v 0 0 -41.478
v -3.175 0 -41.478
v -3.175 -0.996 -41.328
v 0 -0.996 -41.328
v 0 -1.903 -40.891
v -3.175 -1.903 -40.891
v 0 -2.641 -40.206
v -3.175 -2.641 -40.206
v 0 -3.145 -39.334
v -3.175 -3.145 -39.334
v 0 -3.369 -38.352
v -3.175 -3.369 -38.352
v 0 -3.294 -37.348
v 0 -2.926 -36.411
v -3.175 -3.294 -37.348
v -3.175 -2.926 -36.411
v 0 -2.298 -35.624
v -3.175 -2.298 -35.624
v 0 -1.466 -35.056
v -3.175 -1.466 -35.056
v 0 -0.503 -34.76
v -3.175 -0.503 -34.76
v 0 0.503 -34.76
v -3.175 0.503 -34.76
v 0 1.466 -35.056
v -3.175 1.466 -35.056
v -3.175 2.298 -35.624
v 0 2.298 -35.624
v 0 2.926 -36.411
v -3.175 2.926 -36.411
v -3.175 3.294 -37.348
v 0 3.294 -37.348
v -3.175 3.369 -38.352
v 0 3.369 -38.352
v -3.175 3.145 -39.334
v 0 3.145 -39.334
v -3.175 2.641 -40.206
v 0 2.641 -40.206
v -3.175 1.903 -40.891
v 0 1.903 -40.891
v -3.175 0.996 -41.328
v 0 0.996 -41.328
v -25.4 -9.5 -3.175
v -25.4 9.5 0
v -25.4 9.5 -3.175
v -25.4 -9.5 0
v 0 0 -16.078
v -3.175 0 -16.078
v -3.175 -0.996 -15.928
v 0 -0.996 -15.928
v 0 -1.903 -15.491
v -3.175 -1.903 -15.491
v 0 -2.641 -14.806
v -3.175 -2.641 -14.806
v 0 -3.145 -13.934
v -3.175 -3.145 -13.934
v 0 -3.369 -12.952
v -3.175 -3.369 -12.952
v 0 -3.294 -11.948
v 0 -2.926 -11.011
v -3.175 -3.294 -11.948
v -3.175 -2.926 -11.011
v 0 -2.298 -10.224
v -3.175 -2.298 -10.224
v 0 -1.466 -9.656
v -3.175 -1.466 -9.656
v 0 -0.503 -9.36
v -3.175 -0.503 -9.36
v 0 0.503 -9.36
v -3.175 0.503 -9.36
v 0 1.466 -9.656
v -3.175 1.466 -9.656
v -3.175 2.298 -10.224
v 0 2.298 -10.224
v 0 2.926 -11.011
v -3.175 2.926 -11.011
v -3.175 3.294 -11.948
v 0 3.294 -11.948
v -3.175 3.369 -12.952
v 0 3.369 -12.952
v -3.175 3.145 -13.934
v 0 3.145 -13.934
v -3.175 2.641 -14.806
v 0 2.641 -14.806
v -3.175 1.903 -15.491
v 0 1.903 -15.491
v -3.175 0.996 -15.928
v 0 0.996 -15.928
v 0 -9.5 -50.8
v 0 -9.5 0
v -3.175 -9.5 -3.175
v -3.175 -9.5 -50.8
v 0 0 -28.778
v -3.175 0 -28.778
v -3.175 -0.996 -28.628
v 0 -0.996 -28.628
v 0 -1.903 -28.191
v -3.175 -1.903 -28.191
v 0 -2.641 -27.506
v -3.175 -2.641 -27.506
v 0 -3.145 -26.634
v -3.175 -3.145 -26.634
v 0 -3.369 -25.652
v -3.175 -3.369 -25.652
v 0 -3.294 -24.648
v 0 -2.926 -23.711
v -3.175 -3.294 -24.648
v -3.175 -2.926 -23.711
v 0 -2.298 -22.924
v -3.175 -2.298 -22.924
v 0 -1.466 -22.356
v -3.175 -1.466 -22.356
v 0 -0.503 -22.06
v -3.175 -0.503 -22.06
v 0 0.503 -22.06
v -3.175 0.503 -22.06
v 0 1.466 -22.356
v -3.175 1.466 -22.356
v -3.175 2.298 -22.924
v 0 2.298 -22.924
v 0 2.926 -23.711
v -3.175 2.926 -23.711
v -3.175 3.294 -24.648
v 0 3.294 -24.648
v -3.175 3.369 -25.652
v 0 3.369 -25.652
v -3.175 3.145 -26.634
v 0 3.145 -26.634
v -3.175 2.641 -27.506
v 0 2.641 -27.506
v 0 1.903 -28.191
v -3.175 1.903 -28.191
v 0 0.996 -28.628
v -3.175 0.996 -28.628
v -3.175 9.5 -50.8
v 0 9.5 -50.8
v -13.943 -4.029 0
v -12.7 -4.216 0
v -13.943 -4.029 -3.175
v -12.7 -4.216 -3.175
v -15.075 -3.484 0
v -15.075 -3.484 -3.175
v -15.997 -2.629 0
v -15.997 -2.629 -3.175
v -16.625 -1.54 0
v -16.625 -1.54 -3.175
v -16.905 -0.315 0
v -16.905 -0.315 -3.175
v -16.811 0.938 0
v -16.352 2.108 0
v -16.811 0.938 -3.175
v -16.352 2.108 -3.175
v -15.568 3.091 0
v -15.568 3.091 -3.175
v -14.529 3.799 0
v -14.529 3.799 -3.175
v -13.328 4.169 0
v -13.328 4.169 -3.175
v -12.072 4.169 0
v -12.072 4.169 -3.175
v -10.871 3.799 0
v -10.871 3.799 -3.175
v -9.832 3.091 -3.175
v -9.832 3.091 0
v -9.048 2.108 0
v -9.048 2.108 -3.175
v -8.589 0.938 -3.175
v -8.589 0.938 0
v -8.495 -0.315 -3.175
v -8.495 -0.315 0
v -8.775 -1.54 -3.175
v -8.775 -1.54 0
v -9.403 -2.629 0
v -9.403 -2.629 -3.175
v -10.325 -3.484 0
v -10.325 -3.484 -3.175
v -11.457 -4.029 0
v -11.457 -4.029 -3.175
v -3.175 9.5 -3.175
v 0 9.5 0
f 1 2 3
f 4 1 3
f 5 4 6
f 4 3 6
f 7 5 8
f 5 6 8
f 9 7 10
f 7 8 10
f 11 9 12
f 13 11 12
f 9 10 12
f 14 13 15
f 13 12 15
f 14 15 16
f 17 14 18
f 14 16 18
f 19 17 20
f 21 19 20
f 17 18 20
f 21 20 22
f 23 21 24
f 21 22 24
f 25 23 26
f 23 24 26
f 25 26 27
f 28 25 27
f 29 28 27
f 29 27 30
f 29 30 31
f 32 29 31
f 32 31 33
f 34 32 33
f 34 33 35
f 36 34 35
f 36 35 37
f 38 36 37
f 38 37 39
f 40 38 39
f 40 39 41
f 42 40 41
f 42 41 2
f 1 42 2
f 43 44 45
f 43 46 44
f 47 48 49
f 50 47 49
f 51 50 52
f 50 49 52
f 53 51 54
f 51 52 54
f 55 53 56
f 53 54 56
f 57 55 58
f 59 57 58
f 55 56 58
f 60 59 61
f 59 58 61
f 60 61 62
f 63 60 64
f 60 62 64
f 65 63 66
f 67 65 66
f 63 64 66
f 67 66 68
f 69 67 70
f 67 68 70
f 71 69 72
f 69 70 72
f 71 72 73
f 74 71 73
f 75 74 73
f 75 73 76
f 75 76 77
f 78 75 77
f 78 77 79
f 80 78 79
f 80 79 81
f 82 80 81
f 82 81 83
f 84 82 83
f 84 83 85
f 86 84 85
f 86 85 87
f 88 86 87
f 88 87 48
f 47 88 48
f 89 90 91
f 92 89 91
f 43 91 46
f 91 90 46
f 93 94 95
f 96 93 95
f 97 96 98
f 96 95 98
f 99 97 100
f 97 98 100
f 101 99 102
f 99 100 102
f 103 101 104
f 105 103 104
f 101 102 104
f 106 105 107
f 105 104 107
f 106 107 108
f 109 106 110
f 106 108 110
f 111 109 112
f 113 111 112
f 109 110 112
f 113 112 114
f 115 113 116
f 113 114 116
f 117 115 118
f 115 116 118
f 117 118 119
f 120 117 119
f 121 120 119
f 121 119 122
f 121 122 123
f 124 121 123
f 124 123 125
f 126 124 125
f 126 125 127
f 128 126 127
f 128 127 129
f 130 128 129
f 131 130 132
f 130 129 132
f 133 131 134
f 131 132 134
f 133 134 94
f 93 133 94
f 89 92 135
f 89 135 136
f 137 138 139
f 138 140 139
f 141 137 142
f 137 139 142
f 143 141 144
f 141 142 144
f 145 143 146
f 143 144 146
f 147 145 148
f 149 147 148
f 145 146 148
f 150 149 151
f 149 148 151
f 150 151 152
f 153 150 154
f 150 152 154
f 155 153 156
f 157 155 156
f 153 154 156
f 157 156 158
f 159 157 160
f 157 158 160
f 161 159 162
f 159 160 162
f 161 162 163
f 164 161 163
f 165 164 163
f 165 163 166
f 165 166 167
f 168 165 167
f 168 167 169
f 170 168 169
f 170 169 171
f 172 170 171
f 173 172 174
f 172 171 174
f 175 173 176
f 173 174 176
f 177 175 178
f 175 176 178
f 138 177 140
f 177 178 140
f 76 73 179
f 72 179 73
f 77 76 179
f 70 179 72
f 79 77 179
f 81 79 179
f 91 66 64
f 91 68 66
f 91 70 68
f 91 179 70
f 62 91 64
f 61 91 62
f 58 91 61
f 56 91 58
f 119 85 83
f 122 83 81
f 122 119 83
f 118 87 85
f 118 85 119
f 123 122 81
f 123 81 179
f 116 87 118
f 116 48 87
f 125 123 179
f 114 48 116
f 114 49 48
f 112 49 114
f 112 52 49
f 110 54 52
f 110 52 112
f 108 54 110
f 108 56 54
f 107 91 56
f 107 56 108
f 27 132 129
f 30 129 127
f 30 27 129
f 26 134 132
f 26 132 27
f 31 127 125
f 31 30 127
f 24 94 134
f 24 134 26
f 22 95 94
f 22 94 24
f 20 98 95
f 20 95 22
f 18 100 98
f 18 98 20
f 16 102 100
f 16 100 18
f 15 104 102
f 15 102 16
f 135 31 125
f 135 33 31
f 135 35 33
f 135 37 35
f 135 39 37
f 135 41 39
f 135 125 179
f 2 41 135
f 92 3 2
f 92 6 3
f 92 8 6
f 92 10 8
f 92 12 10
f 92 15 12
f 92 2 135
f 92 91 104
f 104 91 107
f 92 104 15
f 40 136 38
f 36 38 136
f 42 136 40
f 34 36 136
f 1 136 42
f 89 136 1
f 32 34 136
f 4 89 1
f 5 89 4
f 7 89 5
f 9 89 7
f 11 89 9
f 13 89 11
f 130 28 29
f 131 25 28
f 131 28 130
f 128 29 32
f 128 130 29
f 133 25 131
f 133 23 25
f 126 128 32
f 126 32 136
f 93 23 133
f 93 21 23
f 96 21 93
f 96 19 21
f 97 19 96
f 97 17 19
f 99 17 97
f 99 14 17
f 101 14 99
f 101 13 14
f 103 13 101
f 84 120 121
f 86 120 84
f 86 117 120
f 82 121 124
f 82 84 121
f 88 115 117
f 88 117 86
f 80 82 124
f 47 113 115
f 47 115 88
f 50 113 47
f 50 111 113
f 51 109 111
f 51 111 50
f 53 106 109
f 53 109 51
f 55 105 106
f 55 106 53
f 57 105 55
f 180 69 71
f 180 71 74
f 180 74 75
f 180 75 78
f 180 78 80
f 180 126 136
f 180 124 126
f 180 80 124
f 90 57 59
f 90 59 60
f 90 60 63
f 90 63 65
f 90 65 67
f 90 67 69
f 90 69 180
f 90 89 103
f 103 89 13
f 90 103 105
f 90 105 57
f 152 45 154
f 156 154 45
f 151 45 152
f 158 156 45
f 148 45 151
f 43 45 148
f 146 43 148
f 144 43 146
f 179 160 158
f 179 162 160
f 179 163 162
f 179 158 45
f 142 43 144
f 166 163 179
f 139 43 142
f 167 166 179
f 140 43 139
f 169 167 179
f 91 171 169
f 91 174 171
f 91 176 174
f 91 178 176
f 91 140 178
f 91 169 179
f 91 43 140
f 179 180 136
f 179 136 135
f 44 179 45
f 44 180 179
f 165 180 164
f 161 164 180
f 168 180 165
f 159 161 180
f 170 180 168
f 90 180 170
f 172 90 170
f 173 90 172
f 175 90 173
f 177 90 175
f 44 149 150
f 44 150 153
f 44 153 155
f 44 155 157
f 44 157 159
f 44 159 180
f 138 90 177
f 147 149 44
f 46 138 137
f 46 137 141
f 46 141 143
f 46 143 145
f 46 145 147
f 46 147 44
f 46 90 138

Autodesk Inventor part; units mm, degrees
ref_plane "YZ Plane" through (0, 0, 0) normal (1, 0, 0) x (0, 1, 0)
ref_plane "XZ Plane" through (0, 0, 0) normal (0, 1, 0) x (-1, 0, 0)
ref_plane "XY Plane" through (0, 0, 0) normal (0, 0, 1) x (1, 0, 0)
sketch "Sketch1" plane through (0, 0, 0) normal (0, 1, 0) x (-1, 0, 0)
  line L0 (0, 0) -> (25.4, 0)
  line L1 (25.4, 0) -> (25.4, -3.175)
  line L2 (25.4, -3.175) -> (3.175, -3.175)
  line L3 (3.175, -3.175) -> (3.175, -50.8)
  line L4 (3.175, -50.8) -> (0, -50.8)
  line L5 (0, -50.8) -> (0, 0)
  dimension "d0" = 25.4
  dimension "d1" = 50.8
  dimension "d2" = 3.175
  dimension "d3" = 3.175
extrude "Extrusion1" add sketch "Sketch1" along normal mid plane 18.9992
sketch "Sketch2" plane through (-25.4, 9.4996, 0) normal (0, 0, 1) x (1, 0, 0)
  line L0 (0, 0) -> (25.4, 0) construction
  line L1 (25.4, -18.9992) -> (25.4, 0) construction
  line L2 (0, 0) -> (25.4, -18.9992) construction
  line L3 (0, 0) -> (0, -18.9992) construction
  line L4 (0, -18.9992) -> (25.4, 0) construction
  point P0 (25.4, -9.4996)
  point P1 (12.7, -9.4996)
hole "Hole1" at (-12.7, 0, 0) direction (0, 0, -1) diameter 8.4328 end through all clearance for "Flat Head Machine Screw (82)" size "5/16" standard "Ansi Unified Screw Threads"
sketch "Sketch3" plane through (0, -9.4996, -50.8) normal (1, 0, 0) x (0, 0, -1)
  line L0 (0, 18.9992) -> (0, 0) construction
  line L1 (-50.8, 18.9992) -> (-50.8, 0) construction
  line L2 (0, 0) -> (-50.8, 0) construction
  line L3 (-50.8, 9.4996) -> (0, 9.4996) construction
  point P0 (-38.1, 9.4996)
  point P1 (-25.4, 9.4996)
  point P2 (-12.7, 9.4996)
  dimension "d20" = 12.7
  dimension "d23" = 12.7
hole "Hole3" at (0, 0, -12.7) at (0, 0, -25.4) at (0, 0, -38.1) direction (-1, 0, 0) diameter 6.7564 end through all clearance for "Flat Head Machine Screw (82)" size "1/4" standard "Ansi Unified Screw Threads"
properties part number "simpleBracketForTopOfDart"
